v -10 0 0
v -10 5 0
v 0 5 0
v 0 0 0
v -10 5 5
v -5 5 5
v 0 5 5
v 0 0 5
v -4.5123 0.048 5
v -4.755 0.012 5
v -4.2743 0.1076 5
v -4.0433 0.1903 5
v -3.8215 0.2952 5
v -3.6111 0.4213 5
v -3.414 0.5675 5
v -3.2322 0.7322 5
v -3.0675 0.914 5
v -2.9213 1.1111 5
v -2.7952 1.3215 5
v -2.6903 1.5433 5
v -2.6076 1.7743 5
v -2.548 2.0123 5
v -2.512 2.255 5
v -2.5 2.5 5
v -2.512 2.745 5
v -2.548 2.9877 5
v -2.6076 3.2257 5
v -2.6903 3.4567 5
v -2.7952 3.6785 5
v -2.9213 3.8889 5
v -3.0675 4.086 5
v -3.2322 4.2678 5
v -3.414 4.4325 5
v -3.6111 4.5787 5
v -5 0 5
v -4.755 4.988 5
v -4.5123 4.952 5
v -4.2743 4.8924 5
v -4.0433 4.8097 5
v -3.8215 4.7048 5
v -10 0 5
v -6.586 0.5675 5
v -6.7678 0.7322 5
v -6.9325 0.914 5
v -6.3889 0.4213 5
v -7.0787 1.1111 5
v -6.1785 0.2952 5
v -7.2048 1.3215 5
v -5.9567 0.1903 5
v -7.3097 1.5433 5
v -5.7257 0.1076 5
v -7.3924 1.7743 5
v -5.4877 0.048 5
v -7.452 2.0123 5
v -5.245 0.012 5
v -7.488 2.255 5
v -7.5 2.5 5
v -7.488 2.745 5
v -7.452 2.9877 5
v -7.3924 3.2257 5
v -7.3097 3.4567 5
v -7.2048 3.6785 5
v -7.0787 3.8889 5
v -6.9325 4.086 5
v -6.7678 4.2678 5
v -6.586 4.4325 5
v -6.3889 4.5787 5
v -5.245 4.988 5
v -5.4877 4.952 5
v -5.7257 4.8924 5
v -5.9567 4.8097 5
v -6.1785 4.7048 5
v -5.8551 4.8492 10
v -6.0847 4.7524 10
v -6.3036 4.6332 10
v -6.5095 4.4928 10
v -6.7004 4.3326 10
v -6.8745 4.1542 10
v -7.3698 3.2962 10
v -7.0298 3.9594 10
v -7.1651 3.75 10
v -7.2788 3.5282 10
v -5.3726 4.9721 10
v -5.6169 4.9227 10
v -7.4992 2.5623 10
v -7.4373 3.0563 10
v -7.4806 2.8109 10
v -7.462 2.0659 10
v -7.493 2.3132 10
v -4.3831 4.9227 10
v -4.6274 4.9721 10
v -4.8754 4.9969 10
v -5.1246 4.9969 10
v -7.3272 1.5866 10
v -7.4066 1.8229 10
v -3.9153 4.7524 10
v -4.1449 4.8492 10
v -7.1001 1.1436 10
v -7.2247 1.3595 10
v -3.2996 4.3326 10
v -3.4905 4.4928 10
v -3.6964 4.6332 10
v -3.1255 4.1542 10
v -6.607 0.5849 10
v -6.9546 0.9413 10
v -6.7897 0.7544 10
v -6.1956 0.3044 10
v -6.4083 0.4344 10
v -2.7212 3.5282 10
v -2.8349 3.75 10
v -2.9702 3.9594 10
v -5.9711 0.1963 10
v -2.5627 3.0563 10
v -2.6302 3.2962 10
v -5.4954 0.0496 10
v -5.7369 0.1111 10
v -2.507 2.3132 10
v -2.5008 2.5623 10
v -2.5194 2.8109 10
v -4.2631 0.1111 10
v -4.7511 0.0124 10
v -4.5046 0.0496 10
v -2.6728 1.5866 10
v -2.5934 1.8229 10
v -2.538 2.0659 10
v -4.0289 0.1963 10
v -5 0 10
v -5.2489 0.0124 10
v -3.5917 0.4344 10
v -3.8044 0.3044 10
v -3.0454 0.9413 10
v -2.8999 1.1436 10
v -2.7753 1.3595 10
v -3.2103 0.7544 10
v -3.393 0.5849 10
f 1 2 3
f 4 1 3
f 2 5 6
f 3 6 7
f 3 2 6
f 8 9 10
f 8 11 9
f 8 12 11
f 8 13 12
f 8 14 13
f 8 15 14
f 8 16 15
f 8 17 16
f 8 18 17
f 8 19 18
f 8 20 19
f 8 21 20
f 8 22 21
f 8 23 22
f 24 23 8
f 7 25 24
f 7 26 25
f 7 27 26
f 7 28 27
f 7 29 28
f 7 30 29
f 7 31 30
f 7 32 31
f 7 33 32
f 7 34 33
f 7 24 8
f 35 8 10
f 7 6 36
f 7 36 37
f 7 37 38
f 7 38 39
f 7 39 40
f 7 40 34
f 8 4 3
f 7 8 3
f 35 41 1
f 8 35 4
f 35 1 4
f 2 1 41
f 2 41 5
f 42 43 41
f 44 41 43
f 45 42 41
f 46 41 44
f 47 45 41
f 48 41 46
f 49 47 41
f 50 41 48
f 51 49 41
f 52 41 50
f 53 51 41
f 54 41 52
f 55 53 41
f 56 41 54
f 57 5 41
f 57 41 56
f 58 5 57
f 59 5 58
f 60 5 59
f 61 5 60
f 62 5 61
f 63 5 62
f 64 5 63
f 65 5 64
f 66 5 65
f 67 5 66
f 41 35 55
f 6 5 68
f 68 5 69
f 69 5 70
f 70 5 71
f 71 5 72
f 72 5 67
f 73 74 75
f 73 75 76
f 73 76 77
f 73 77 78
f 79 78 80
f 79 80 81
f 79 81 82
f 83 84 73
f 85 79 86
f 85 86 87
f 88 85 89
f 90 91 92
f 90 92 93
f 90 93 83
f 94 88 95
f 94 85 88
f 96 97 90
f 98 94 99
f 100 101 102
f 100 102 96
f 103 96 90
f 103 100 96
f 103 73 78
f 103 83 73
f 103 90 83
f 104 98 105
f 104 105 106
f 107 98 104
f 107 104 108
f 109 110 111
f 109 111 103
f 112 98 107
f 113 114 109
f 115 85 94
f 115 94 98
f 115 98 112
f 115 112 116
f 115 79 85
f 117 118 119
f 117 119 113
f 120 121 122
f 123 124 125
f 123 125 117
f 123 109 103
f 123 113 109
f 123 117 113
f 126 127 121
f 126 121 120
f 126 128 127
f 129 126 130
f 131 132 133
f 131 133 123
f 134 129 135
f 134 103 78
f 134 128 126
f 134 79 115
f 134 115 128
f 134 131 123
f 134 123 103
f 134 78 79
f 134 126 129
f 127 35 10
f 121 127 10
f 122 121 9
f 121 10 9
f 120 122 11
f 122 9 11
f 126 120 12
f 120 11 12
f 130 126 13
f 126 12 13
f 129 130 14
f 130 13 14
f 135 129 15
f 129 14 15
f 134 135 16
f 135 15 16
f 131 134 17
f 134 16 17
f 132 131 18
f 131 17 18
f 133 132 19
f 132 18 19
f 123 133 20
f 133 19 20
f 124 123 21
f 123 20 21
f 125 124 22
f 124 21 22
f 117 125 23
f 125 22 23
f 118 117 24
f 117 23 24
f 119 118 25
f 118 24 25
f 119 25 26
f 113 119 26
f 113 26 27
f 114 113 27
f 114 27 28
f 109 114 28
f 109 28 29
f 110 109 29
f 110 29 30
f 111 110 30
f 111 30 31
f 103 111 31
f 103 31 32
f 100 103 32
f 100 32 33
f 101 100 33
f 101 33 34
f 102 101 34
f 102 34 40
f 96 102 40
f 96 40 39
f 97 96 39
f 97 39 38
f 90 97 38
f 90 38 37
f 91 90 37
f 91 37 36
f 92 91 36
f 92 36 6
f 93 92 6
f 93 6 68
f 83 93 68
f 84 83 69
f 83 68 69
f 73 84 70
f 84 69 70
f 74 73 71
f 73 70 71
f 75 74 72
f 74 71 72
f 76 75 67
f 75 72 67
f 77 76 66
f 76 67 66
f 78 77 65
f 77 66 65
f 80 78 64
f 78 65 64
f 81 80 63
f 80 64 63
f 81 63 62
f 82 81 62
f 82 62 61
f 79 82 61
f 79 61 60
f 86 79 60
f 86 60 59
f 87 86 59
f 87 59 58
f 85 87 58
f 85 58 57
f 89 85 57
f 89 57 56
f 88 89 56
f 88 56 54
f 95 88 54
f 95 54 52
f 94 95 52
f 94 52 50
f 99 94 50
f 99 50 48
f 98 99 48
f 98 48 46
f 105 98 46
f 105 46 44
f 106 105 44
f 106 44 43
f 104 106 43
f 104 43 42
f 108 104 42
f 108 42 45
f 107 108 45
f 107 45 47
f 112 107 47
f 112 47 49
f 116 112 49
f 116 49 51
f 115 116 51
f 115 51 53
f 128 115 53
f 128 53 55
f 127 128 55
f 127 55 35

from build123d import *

# Parameters (mm, degrees)
SKETCH1_W           = 10
SKETCH1_H           = 5
BOSS_EXTRUDE1_DEPTH = 5
SKETCH2_R           = 2.5
BOSS_EXTRUDE2_DEPTH = 5


with BuildPart() as part:
    # Sketch1 → Boss-Extrude1 (new body)
    with BuildSketch(Plane.XY):
        with Locations((-5, 2.5)):
            Rectangle(SKETCH1_W, SKETCH1_H)
    extrude(amount=BOSS_EXTRUDE1_DEPTH)

    # Sketch2 → Boss-Extrude2 (add)
    with BuildSketch(Plane.XY.offset(5)):
        with Locations(Location((-5, 2.5, 0), (0, 0, 270))):
            Circle(SKETCH2_R)
    extrude(amount=BOSS_EXTRUDE2_DEPTH)


solid = part.part
